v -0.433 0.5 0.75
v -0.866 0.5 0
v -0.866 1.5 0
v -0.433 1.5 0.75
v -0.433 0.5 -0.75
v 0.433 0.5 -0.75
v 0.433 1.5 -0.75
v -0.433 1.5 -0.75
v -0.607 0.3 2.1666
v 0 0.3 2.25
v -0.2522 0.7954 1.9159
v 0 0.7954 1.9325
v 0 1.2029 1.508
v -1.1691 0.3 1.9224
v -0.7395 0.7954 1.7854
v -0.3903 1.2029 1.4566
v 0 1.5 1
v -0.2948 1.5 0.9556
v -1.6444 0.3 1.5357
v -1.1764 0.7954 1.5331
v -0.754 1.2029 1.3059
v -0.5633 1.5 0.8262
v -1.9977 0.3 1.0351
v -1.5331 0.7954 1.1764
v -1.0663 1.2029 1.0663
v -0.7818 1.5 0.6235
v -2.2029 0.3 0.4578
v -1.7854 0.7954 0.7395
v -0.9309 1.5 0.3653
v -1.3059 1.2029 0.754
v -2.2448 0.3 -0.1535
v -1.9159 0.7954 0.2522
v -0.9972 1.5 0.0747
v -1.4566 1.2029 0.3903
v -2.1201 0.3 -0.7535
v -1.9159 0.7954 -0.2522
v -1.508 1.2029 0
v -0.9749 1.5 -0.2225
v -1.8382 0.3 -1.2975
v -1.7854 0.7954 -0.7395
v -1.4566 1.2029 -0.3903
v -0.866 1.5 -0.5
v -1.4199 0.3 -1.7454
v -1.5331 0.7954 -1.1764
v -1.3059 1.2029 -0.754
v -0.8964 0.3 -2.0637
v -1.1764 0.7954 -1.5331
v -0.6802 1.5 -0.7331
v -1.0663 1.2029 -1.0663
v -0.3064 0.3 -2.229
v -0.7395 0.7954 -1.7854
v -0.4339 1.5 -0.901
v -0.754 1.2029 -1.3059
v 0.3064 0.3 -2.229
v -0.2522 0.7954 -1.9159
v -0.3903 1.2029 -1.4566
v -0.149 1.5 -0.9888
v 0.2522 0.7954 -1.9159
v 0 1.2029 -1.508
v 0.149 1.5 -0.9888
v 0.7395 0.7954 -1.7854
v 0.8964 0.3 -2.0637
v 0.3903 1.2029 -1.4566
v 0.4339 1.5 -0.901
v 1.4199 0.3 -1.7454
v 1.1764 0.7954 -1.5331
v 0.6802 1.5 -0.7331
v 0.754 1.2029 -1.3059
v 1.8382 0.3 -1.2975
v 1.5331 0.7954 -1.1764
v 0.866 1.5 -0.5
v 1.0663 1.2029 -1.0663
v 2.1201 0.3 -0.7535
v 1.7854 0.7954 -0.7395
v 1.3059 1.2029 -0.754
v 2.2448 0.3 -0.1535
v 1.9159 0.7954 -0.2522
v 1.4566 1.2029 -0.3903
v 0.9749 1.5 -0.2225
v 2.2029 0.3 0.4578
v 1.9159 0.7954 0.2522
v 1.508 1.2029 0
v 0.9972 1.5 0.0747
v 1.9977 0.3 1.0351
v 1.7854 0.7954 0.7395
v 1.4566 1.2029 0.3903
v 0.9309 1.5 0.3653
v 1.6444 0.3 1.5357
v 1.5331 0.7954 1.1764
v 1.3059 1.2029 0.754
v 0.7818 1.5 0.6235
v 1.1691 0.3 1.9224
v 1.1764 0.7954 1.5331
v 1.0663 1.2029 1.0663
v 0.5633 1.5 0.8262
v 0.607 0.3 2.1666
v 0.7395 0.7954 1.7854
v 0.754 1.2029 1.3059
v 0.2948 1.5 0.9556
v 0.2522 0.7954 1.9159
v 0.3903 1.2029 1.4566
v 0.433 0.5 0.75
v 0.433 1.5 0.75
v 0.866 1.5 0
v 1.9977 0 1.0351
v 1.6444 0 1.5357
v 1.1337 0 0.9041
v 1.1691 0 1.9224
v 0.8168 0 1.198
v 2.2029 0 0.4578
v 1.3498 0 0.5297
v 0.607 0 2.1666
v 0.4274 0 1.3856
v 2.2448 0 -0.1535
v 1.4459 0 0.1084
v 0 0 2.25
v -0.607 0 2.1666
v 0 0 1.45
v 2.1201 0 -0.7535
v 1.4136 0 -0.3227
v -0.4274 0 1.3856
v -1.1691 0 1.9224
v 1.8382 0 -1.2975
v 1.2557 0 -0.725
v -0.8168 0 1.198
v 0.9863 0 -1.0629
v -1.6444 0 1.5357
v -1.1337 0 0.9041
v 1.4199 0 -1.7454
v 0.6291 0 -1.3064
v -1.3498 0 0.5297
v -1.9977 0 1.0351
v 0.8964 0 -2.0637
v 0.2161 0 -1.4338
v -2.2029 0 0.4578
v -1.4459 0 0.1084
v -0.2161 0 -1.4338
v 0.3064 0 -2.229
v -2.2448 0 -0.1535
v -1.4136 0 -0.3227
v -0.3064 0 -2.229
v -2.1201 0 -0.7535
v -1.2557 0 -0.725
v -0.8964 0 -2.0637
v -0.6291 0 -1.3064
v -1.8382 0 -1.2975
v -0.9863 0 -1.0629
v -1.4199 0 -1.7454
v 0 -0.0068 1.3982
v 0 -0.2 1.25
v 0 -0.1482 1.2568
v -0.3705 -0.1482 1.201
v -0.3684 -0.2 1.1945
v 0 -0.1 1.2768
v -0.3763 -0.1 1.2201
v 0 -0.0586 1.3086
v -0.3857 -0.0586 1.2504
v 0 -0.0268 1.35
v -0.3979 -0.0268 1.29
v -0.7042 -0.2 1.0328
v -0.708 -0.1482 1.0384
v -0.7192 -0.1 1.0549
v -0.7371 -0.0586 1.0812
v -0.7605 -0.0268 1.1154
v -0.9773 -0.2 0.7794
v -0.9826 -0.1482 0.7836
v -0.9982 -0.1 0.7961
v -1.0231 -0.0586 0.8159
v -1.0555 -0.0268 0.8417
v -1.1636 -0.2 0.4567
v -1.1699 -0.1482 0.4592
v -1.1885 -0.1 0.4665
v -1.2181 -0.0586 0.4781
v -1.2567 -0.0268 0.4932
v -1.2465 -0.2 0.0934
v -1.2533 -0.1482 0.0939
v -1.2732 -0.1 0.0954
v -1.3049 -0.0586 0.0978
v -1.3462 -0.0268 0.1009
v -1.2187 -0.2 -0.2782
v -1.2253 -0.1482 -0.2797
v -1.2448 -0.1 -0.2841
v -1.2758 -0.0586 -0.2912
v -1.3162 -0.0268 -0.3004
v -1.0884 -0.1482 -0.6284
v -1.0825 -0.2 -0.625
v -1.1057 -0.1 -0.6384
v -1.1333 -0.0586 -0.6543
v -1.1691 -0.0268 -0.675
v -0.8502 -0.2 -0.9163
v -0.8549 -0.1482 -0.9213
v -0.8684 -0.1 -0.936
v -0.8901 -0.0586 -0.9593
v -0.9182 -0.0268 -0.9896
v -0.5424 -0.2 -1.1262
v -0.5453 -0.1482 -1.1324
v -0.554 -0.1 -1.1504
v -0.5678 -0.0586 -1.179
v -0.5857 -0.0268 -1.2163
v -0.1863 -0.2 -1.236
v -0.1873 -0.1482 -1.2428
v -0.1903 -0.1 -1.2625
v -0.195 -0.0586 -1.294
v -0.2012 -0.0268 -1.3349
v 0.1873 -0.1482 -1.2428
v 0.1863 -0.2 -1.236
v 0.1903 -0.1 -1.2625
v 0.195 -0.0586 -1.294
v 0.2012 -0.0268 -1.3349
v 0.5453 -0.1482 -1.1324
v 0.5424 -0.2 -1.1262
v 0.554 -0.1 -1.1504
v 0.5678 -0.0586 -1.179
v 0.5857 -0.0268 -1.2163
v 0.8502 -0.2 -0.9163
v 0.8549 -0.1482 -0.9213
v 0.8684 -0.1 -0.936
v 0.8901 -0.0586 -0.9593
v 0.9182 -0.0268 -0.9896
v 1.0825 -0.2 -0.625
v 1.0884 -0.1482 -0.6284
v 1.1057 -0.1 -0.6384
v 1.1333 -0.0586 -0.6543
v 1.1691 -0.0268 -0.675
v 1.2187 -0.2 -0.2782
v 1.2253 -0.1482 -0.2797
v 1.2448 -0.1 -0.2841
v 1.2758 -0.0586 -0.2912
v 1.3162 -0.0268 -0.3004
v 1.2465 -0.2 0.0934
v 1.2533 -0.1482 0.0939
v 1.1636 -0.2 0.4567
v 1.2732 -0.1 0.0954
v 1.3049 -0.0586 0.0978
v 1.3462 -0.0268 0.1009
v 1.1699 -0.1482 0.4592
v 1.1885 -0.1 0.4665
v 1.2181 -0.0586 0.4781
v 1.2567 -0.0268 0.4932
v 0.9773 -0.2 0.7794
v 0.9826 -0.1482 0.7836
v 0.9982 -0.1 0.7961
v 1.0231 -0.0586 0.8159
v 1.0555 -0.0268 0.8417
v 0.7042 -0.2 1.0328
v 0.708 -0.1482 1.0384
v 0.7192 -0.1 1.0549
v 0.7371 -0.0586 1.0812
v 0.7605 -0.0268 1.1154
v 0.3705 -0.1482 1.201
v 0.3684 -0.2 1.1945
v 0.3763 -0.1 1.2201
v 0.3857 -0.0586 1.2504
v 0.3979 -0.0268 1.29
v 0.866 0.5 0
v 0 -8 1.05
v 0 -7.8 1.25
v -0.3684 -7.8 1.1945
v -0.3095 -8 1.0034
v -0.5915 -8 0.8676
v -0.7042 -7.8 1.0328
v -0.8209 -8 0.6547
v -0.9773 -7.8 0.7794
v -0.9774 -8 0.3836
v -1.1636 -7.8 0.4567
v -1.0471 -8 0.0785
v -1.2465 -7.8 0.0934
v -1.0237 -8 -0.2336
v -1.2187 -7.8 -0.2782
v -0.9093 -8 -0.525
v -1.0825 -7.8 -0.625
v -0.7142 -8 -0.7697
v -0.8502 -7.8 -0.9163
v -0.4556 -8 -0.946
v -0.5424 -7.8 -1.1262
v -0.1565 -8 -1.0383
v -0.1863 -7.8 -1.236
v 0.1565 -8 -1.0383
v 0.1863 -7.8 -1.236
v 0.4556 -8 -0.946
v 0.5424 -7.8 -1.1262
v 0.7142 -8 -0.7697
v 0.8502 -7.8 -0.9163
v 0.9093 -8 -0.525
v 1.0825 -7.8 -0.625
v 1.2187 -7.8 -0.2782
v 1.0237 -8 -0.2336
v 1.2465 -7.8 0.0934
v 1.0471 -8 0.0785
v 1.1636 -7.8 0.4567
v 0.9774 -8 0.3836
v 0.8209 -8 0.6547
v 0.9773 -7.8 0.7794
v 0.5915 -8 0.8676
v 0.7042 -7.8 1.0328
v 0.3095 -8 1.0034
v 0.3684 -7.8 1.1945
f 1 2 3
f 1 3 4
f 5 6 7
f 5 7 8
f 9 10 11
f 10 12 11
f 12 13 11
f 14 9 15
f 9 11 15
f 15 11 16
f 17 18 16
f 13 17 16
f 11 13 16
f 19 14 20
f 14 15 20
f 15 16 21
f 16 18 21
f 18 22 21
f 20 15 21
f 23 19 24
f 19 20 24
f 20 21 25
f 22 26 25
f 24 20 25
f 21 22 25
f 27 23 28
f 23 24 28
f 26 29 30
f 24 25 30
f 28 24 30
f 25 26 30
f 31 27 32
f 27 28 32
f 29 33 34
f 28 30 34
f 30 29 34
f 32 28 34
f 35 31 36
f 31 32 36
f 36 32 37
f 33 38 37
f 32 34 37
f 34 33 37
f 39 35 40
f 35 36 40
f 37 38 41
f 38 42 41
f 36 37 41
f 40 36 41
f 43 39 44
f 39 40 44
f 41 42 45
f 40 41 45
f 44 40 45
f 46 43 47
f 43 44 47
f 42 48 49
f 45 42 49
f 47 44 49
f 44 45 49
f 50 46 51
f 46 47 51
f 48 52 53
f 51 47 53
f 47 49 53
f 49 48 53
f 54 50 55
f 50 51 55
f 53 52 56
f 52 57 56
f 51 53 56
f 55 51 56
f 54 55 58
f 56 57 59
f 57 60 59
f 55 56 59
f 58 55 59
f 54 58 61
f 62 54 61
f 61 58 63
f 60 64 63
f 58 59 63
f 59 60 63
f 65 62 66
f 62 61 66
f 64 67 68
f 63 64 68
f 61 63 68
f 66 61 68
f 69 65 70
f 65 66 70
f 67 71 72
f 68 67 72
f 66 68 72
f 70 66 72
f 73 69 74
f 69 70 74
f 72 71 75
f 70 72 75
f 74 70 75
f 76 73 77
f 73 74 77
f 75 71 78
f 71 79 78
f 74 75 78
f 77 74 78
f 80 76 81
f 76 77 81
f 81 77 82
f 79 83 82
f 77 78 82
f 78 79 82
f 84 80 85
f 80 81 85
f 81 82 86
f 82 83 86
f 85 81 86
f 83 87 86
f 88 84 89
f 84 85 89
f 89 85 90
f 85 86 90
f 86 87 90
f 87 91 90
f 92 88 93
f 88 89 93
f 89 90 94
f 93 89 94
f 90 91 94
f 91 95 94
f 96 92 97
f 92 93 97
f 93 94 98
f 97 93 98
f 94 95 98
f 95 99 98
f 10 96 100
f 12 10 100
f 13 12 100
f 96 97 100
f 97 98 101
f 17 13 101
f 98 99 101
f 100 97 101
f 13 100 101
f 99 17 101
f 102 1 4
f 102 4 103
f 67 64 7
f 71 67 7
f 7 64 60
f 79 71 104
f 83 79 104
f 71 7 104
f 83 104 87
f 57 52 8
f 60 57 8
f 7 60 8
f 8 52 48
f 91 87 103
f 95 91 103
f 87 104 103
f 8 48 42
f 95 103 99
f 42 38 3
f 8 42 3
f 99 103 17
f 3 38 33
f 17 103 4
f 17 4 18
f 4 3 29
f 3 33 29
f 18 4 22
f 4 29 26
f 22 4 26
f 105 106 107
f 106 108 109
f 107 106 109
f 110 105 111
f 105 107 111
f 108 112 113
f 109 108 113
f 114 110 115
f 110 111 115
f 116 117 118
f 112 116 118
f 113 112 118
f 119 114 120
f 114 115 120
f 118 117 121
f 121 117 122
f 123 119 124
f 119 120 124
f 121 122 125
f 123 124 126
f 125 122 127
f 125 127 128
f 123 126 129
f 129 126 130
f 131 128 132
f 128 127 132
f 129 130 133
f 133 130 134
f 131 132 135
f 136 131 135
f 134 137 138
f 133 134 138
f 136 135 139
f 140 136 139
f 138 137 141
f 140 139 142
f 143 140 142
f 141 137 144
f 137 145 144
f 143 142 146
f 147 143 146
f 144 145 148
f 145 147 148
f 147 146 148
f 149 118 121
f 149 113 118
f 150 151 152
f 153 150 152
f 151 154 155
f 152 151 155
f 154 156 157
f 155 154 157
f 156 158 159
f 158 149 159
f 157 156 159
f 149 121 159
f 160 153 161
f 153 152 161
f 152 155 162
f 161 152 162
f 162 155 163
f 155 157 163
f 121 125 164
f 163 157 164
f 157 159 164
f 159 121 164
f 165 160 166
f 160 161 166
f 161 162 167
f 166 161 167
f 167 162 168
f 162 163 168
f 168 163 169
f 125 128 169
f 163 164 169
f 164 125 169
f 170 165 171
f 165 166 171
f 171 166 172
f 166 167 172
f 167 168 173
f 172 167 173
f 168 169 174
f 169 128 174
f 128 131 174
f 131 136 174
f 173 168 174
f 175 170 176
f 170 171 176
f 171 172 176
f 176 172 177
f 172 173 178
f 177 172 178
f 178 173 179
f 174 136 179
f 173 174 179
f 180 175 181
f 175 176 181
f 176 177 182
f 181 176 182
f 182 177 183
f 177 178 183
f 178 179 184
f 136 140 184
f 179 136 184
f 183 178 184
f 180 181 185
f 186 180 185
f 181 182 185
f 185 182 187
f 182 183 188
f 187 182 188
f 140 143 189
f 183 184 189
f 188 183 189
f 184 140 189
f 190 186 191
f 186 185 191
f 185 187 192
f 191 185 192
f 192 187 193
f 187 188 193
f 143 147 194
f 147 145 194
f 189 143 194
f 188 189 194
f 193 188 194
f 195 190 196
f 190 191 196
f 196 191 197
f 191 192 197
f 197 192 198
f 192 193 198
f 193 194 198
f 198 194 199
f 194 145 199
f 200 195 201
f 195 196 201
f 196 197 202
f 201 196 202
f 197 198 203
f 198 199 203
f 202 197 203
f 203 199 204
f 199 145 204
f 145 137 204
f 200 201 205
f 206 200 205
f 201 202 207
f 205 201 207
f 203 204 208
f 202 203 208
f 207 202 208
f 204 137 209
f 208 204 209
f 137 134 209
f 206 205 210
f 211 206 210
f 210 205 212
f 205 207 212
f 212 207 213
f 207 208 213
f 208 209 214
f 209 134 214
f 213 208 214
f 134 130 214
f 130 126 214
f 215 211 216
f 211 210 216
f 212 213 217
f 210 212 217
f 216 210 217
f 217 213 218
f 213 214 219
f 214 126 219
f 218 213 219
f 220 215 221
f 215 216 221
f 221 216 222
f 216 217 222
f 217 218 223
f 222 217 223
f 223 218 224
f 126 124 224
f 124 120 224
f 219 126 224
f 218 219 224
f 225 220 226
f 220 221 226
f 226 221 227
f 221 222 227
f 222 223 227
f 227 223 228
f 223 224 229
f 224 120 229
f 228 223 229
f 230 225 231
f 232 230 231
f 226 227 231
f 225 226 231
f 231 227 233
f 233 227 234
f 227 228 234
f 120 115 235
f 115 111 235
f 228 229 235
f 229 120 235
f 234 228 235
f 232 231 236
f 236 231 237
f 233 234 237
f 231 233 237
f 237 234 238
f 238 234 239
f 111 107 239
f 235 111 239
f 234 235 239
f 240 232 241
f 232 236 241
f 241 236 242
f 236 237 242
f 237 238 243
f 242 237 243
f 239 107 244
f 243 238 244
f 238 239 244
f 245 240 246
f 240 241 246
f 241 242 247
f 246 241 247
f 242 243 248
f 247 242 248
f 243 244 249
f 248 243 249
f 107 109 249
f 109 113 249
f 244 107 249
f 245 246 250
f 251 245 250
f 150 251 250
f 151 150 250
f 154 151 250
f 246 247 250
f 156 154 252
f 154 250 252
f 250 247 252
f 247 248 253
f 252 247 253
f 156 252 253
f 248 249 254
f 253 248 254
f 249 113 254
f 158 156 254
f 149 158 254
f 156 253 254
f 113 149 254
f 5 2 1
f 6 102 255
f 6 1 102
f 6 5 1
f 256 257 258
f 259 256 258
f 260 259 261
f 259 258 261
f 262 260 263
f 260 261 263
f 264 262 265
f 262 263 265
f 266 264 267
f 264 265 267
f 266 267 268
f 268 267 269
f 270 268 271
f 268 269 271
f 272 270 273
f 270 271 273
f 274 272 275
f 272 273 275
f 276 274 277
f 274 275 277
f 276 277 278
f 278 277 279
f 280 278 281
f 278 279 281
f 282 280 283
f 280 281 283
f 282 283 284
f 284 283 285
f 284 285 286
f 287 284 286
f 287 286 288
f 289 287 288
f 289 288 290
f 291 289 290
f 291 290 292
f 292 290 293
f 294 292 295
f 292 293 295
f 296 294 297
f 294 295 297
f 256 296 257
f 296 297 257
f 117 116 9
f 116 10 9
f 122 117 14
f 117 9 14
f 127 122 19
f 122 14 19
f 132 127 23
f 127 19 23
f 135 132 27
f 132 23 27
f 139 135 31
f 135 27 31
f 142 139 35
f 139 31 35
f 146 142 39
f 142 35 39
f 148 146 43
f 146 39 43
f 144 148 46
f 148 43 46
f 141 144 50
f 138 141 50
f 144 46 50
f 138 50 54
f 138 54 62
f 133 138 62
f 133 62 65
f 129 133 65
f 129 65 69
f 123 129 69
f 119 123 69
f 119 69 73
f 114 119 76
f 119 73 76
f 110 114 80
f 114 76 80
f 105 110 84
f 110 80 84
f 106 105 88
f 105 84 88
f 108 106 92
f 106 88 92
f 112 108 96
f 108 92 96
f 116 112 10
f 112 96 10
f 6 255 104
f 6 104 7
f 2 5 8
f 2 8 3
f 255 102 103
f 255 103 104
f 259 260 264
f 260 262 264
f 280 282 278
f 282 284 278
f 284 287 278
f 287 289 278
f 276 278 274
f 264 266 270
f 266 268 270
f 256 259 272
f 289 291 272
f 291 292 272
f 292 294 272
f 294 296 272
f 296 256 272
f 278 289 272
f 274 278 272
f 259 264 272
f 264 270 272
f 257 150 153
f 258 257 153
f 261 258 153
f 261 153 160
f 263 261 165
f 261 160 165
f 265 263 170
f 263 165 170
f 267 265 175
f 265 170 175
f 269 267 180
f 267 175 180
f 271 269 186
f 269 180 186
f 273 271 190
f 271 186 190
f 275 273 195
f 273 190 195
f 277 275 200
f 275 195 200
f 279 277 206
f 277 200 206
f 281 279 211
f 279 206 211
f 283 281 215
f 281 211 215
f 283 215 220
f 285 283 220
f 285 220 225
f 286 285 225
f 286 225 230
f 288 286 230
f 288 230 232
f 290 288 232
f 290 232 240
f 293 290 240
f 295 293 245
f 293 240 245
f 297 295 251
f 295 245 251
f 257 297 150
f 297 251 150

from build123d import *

# Parameters (mm, degrees)
CHAMFER1_SIZE      = 0.2
CUT_EXTRUDE1_START = 0.5
CUT_EXTRUDE1_DEPTH = 10
FILLET1_R          = 0.2


with BuildPart() as part:
    # Sketch1 → Revolve1 (revolve)
    with BuildSketch(Plane.XY, mode=Mode.PRIVATE) as revolve1_sk:
        with BuildLine():
            Line((1.25, 0), (2.25, 0))
            Line((2.25, 0), (2.25, 0.3))
            ThreePointArc((2.25, 0.3), (1.73223122, 1.011699188), (1, 1.5))
            Line((1, 1.5), (0, 1.5))
            Line((0, 1.5), (0, -8))
            Line((0, -8), (1.25, -8))
            Line((1.25, -8), (1.25, 0))
        make_face()
    revolve(revolve1_sk.sketch.rotate(Axis((0, 21.344098617, 0), (0, -1, 0)), 90), axis=Axis((0, 21.344098617, 0), (0, -1, 0)))

    # Chamfer1
    chamfer1_edges = [part.edges().sort_by_distance(p)[0] for p in [
        (0, -8, -1.25),
    ]]
    chamfer(chamfer1_edges, length=CHAMFER1_SIZE)

    # Sketch2 → Cut-Extrude1 (cut)
    with BuildSketch(Plane(origin=(0, 0, 0), x_dir=(1, 0, 0), z_dir=(0, 1, 0)).offset(CUT_EXTRUDE1_START)):
        Polygon((0.433012702, -0.75), (0.866025404, 0), (0.433012702, 0.75), (-0.433012702, 0.75), (-0.866025404, 0), (-0.433012702, -0.75), align=None)
    extrude(amount=CUT_EXTRUDE1_DEPTH, mode=Mode.SUBTRACT)

    # Fillet1
    fillet1_edges = [part.edges().sort_by_distance(p)[0] for p in [
        (0, 0, -1.25),
    ]]
    fillet(fillet1_edges, radius=FILLET1_R)


solid = part.part
